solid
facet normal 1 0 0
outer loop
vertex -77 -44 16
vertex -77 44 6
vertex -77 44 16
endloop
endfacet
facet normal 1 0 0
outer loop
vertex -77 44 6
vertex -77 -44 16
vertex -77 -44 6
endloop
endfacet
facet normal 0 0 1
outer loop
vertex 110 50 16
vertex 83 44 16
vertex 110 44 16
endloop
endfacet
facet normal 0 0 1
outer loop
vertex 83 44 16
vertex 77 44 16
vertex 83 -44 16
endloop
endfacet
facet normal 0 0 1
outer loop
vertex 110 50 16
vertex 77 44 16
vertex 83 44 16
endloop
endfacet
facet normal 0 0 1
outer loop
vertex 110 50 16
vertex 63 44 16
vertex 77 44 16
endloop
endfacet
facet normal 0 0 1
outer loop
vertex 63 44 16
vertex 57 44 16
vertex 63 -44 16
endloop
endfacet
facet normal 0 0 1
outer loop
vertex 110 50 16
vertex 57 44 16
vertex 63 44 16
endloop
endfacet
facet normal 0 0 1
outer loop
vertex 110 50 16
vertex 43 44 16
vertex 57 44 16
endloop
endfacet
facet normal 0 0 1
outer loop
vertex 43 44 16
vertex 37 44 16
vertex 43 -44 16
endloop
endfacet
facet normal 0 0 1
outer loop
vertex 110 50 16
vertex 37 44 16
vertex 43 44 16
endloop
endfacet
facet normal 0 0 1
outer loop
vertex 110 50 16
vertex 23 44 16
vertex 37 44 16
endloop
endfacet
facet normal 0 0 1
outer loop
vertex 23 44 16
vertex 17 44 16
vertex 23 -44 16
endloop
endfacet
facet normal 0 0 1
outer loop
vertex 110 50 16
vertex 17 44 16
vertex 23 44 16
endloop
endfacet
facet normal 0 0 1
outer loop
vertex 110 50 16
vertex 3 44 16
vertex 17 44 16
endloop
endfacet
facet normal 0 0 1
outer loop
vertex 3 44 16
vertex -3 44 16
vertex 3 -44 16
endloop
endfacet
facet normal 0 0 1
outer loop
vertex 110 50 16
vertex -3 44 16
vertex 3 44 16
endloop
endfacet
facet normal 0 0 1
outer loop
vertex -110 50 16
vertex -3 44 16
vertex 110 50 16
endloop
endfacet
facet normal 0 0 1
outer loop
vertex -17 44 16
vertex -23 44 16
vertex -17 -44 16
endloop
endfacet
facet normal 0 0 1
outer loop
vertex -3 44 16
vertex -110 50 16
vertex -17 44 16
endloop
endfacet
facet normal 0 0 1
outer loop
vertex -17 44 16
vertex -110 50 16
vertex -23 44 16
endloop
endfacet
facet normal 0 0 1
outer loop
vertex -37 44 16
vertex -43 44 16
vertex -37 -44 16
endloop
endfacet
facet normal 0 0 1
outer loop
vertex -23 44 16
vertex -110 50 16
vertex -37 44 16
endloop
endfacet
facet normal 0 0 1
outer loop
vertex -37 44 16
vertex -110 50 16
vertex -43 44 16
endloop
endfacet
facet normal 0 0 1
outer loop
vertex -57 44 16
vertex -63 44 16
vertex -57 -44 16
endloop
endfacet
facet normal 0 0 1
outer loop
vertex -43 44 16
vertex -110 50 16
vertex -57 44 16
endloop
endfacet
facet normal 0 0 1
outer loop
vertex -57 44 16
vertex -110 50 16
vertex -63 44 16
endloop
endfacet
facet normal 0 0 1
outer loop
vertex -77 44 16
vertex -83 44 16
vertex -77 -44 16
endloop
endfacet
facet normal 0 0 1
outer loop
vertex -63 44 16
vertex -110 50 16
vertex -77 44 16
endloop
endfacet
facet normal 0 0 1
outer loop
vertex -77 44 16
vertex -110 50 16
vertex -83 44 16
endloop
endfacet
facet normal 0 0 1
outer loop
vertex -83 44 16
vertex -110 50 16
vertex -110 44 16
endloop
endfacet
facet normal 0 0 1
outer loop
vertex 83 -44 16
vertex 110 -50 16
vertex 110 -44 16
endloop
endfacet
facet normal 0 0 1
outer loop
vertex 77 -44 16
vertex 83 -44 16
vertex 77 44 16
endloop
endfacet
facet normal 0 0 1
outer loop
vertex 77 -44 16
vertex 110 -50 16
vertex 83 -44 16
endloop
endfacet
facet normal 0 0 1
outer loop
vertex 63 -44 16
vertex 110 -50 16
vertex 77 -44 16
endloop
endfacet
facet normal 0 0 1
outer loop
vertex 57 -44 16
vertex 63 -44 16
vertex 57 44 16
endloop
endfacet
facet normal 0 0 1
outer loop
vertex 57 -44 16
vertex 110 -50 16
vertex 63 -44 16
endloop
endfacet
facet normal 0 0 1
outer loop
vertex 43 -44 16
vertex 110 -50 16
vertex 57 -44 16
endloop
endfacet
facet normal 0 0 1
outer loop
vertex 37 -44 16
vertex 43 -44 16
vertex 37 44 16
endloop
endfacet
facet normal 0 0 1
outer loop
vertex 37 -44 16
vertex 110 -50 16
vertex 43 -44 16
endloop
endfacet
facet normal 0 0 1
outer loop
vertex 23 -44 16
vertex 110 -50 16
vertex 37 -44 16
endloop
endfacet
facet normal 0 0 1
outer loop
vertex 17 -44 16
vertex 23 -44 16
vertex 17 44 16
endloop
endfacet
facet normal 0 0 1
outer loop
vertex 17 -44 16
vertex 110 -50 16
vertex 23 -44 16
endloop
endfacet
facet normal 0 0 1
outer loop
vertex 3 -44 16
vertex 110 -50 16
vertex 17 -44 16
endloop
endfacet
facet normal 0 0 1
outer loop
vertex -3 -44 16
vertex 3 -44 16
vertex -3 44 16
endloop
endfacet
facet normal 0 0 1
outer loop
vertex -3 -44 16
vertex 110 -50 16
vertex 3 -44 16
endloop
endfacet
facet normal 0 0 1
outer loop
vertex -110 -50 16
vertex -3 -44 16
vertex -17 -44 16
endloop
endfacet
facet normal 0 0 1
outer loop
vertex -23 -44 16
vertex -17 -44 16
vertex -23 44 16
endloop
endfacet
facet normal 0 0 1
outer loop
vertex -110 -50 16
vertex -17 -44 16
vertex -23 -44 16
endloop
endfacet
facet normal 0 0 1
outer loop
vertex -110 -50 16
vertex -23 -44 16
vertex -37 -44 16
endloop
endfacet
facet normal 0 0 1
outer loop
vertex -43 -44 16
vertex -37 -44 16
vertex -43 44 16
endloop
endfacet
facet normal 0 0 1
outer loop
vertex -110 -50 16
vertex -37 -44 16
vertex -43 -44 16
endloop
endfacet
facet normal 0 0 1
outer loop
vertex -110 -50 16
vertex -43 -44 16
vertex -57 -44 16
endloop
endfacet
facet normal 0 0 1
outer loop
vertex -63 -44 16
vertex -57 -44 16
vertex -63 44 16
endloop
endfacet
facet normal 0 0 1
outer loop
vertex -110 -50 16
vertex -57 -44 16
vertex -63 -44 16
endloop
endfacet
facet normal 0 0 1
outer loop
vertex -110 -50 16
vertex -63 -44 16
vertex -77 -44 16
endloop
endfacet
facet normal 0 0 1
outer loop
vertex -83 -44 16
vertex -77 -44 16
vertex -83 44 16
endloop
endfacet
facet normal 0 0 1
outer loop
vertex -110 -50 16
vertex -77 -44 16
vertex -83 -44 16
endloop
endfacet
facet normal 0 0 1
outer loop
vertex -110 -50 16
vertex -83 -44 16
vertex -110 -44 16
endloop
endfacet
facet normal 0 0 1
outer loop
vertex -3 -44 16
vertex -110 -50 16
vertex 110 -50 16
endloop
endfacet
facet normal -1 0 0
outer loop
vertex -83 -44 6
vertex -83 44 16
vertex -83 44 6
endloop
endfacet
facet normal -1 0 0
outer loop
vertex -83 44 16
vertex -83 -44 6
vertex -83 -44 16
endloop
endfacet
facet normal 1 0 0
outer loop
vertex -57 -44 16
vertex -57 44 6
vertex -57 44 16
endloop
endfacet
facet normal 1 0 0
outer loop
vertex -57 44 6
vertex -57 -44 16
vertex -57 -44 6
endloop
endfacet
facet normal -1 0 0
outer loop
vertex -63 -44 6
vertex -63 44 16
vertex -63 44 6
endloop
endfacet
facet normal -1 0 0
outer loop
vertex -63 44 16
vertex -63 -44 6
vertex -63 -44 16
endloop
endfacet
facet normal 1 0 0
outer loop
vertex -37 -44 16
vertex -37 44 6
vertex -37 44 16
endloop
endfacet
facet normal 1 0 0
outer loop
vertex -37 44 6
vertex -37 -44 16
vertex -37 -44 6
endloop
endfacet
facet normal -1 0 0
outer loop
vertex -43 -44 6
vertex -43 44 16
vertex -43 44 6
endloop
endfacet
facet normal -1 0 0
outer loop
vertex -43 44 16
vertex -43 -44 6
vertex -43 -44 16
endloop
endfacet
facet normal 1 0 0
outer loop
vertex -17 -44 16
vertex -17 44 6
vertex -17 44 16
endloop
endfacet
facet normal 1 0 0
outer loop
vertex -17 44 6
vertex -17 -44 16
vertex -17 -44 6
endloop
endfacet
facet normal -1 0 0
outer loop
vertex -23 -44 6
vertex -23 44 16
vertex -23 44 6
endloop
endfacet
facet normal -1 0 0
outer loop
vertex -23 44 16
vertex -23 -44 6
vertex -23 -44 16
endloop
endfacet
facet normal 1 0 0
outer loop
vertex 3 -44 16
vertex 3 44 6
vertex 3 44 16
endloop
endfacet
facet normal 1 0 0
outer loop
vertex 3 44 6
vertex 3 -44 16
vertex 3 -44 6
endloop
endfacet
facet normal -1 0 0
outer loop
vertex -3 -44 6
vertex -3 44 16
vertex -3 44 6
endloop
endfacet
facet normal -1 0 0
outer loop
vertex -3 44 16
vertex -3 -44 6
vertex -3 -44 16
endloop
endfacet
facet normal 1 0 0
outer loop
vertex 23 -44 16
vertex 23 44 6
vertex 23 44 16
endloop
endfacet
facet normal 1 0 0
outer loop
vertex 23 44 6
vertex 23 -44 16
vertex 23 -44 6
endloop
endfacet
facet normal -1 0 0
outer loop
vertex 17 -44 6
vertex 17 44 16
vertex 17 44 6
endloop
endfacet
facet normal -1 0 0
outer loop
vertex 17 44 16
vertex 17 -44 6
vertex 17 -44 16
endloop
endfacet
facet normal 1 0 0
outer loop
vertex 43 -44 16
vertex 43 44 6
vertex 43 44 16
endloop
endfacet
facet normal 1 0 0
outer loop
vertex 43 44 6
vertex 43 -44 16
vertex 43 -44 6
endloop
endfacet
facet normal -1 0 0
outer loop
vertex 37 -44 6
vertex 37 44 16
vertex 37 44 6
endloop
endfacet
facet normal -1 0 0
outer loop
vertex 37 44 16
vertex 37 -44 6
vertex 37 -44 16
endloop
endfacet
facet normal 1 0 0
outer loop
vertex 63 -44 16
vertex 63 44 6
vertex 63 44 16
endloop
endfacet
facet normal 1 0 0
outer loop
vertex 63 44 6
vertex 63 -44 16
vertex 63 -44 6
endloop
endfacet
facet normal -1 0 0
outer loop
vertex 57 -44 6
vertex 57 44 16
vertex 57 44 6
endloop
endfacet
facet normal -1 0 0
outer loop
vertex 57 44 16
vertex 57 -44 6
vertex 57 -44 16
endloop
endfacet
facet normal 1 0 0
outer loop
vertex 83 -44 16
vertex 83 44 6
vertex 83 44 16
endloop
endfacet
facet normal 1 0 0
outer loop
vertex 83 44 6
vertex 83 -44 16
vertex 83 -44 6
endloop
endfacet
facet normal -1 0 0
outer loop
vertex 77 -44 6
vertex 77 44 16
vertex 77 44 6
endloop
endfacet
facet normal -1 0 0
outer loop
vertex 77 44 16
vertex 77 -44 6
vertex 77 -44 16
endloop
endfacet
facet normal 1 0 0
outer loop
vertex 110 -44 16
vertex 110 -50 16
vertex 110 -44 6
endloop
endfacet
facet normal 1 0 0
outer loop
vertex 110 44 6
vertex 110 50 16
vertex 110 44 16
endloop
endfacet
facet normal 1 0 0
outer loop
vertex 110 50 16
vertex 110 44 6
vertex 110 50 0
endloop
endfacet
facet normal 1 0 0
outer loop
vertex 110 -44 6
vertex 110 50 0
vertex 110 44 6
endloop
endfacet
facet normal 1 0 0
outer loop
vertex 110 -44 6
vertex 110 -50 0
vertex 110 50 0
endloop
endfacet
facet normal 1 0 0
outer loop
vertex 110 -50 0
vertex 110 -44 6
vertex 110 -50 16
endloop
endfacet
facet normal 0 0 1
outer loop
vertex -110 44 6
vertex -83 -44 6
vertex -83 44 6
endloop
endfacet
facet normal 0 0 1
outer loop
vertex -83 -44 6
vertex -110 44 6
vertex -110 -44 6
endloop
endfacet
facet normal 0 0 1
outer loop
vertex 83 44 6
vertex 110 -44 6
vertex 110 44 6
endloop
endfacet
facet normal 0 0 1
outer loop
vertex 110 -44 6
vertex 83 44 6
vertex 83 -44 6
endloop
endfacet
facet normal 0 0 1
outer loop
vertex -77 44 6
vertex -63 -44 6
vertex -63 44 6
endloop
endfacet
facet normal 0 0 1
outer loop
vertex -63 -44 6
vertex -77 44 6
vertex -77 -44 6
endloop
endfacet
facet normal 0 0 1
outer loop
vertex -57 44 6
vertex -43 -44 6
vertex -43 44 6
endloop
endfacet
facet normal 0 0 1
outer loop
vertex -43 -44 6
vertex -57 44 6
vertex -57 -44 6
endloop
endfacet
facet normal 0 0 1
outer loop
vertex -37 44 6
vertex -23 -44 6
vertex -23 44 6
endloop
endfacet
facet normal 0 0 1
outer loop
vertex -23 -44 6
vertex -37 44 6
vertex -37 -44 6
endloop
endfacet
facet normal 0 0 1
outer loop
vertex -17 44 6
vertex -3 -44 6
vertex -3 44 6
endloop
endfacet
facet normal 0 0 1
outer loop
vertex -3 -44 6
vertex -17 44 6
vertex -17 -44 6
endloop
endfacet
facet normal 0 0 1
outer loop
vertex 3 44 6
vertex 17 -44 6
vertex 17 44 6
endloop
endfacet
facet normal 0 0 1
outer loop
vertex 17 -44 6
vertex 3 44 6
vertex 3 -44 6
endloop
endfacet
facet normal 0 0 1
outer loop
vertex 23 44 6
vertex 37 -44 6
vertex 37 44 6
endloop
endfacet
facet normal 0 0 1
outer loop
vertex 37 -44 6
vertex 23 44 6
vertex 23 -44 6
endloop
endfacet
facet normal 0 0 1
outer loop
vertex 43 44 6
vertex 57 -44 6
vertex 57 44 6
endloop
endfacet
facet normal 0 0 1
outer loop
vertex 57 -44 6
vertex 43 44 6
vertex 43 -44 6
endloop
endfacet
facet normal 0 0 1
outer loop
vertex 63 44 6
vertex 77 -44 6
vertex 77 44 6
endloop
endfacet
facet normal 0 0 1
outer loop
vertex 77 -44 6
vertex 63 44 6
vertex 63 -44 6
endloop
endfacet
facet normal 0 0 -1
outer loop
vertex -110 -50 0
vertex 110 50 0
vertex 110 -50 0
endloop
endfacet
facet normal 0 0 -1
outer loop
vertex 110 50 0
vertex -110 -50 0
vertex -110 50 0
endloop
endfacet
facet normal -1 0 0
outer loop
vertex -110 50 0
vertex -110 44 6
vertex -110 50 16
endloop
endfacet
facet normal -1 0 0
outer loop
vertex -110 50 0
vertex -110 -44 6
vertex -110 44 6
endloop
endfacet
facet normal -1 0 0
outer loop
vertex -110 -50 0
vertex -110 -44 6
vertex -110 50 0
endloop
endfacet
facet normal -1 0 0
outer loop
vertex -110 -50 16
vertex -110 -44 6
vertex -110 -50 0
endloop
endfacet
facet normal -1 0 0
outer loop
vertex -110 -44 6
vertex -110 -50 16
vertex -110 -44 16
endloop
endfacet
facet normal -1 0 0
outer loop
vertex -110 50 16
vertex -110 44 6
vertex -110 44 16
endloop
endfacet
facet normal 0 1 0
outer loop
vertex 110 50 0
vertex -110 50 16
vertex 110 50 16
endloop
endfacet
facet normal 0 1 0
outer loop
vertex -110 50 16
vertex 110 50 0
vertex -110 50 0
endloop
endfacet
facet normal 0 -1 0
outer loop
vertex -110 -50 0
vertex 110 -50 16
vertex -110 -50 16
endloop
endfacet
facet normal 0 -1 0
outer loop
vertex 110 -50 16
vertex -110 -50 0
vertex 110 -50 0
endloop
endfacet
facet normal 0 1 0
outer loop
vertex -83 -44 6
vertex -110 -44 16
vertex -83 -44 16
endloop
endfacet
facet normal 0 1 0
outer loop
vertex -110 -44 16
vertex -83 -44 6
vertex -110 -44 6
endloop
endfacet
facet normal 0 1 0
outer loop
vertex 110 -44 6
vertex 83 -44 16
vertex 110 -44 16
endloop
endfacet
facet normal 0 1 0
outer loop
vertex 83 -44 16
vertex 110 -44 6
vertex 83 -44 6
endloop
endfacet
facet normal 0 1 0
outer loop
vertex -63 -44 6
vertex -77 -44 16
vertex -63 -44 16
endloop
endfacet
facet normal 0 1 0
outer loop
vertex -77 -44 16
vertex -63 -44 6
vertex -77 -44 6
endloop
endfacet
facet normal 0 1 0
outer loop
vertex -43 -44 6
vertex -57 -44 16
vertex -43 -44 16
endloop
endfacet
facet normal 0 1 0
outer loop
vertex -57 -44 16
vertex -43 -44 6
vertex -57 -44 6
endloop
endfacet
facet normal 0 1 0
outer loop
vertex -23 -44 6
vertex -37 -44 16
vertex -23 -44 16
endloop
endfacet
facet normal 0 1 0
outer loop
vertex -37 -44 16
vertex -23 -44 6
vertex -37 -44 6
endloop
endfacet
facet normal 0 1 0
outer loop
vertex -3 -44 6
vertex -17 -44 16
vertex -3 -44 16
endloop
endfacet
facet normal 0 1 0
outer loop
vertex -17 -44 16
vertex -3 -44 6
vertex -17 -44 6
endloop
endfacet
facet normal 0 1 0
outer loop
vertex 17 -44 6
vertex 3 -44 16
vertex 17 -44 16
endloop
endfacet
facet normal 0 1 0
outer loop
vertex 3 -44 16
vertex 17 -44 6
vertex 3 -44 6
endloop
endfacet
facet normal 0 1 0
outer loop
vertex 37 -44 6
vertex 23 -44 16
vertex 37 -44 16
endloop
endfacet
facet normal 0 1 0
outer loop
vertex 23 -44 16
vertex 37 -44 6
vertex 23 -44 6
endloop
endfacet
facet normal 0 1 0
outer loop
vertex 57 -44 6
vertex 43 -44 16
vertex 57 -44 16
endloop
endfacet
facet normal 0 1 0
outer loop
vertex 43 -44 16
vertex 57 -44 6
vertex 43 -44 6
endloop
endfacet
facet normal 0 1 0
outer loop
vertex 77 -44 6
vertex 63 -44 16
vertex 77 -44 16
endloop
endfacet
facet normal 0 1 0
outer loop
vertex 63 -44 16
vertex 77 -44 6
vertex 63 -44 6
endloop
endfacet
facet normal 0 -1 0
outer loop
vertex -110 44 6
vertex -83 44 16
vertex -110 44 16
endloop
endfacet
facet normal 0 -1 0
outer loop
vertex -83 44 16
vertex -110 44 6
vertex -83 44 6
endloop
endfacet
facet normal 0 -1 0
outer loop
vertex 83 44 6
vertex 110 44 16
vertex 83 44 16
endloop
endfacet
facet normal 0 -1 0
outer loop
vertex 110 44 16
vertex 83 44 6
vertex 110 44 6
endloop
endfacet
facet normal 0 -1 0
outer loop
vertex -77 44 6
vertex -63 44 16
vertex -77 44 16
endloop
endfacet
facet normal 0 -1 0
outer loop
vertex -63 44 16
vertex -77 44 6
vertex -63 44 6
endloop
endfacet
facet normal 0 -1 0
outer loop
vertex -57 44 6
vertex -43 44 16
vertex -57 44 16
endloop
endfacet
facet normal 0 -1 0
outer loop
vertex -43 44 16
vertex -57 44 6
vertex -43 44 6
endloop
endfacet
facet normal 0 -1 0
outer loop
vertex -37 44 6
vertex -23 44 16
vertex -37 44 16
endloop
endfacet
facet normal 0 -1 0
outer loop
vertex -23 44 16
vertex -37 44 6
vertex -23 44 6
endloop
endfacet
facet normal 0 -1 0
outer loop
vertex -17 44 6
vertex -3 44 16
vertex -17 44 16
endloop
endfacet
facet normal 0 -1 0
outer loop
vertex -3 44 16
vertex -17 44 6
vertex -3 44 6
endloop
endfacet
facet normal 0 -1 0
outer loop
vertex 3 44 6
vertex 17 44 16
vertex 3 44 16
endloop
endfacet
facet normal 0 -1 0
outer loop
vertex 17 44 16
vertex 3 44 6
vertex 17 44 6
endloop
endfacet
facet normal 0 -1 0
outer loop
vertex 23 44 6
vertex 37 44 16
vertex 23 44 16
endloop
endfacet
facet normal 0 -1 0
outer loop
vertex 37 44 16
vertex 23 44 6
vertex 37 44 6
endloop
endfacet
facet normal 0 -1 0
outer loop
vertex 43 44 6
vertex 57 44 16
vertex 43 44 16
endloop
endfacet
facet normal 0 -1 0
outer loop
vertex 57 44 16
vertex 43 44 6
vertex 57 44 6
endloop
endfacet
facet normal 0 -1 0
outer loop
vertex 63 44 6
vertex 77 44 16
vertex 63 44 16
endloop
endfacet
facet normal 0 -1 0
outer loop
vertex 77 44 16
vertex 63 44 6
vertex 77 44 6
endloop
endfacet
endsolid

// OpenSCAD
$fn = 32;

// ----------------------------------------------------------------------
// Rib frame 220 x 100 x 16
// 9 ribs at 20 mm pitch
// ----------------------------------------------------------------------

// --- parameters (mm) ---
frame = [220, 100, 6];  // base plate size (x, y, z)
rail_w = 6;             // side rail width
ribs = 9;               // number of ribs
rib_t = 6;              // rib thickness
rib_h = 10;             // rib height above the base plate
pitch = 20;             // pitch between rib centres

// --- derived feature positions (mm) ---
span = (ribs - 1) * pitch;          // = 160   distance between the outer ribs
origin_x = -span / 2;               // = -80   X of the first rib
rib_len = frame[1] - 2 * rail_w + 2;  // = 90   rib length, 1 mm into each rail
feature_centers = [
  [origin_x + 0 * pitch, 0],
  [origin_x + 1 * pitch, 0],
  [origin_x + 2 * pitch, 0],
  [origin_x + 3 * pitch, 0],
  [origin_x + 4 * pitch, 0],
  [origin_x + 5 * pitch, 0],
  [origin_x + 6 * pitch, 0],
  [origin_x + 7 * pitch, 0],
  [origin_x + 8 * pitch, 0]
];   // rib centre line, drives the rib loop

// base plate, two side rails, then the ribs read straight off feature_centers
union() {
  translate([-frame[0] / 2, -frame[1] / 2, 0]) cube(frame);
  translate([-frame[0] / 2, -frame[1] / 2, 0]) cube([frame[0], rail_w, frame[2] + rib_h]);
  translate([-frame[0] / 2, frame[1] / 2 - rail_w, 0]) cube([frame[0], rail_w, frame[2] + rib_h]);
  for (centre = feature_centers)
    translate([centre[0] - rib_t / 2, centre[1] - rib_len / 2, frame[2] - 1])
      cube([rib_t, rib_len, rib_h + 1]);
}
